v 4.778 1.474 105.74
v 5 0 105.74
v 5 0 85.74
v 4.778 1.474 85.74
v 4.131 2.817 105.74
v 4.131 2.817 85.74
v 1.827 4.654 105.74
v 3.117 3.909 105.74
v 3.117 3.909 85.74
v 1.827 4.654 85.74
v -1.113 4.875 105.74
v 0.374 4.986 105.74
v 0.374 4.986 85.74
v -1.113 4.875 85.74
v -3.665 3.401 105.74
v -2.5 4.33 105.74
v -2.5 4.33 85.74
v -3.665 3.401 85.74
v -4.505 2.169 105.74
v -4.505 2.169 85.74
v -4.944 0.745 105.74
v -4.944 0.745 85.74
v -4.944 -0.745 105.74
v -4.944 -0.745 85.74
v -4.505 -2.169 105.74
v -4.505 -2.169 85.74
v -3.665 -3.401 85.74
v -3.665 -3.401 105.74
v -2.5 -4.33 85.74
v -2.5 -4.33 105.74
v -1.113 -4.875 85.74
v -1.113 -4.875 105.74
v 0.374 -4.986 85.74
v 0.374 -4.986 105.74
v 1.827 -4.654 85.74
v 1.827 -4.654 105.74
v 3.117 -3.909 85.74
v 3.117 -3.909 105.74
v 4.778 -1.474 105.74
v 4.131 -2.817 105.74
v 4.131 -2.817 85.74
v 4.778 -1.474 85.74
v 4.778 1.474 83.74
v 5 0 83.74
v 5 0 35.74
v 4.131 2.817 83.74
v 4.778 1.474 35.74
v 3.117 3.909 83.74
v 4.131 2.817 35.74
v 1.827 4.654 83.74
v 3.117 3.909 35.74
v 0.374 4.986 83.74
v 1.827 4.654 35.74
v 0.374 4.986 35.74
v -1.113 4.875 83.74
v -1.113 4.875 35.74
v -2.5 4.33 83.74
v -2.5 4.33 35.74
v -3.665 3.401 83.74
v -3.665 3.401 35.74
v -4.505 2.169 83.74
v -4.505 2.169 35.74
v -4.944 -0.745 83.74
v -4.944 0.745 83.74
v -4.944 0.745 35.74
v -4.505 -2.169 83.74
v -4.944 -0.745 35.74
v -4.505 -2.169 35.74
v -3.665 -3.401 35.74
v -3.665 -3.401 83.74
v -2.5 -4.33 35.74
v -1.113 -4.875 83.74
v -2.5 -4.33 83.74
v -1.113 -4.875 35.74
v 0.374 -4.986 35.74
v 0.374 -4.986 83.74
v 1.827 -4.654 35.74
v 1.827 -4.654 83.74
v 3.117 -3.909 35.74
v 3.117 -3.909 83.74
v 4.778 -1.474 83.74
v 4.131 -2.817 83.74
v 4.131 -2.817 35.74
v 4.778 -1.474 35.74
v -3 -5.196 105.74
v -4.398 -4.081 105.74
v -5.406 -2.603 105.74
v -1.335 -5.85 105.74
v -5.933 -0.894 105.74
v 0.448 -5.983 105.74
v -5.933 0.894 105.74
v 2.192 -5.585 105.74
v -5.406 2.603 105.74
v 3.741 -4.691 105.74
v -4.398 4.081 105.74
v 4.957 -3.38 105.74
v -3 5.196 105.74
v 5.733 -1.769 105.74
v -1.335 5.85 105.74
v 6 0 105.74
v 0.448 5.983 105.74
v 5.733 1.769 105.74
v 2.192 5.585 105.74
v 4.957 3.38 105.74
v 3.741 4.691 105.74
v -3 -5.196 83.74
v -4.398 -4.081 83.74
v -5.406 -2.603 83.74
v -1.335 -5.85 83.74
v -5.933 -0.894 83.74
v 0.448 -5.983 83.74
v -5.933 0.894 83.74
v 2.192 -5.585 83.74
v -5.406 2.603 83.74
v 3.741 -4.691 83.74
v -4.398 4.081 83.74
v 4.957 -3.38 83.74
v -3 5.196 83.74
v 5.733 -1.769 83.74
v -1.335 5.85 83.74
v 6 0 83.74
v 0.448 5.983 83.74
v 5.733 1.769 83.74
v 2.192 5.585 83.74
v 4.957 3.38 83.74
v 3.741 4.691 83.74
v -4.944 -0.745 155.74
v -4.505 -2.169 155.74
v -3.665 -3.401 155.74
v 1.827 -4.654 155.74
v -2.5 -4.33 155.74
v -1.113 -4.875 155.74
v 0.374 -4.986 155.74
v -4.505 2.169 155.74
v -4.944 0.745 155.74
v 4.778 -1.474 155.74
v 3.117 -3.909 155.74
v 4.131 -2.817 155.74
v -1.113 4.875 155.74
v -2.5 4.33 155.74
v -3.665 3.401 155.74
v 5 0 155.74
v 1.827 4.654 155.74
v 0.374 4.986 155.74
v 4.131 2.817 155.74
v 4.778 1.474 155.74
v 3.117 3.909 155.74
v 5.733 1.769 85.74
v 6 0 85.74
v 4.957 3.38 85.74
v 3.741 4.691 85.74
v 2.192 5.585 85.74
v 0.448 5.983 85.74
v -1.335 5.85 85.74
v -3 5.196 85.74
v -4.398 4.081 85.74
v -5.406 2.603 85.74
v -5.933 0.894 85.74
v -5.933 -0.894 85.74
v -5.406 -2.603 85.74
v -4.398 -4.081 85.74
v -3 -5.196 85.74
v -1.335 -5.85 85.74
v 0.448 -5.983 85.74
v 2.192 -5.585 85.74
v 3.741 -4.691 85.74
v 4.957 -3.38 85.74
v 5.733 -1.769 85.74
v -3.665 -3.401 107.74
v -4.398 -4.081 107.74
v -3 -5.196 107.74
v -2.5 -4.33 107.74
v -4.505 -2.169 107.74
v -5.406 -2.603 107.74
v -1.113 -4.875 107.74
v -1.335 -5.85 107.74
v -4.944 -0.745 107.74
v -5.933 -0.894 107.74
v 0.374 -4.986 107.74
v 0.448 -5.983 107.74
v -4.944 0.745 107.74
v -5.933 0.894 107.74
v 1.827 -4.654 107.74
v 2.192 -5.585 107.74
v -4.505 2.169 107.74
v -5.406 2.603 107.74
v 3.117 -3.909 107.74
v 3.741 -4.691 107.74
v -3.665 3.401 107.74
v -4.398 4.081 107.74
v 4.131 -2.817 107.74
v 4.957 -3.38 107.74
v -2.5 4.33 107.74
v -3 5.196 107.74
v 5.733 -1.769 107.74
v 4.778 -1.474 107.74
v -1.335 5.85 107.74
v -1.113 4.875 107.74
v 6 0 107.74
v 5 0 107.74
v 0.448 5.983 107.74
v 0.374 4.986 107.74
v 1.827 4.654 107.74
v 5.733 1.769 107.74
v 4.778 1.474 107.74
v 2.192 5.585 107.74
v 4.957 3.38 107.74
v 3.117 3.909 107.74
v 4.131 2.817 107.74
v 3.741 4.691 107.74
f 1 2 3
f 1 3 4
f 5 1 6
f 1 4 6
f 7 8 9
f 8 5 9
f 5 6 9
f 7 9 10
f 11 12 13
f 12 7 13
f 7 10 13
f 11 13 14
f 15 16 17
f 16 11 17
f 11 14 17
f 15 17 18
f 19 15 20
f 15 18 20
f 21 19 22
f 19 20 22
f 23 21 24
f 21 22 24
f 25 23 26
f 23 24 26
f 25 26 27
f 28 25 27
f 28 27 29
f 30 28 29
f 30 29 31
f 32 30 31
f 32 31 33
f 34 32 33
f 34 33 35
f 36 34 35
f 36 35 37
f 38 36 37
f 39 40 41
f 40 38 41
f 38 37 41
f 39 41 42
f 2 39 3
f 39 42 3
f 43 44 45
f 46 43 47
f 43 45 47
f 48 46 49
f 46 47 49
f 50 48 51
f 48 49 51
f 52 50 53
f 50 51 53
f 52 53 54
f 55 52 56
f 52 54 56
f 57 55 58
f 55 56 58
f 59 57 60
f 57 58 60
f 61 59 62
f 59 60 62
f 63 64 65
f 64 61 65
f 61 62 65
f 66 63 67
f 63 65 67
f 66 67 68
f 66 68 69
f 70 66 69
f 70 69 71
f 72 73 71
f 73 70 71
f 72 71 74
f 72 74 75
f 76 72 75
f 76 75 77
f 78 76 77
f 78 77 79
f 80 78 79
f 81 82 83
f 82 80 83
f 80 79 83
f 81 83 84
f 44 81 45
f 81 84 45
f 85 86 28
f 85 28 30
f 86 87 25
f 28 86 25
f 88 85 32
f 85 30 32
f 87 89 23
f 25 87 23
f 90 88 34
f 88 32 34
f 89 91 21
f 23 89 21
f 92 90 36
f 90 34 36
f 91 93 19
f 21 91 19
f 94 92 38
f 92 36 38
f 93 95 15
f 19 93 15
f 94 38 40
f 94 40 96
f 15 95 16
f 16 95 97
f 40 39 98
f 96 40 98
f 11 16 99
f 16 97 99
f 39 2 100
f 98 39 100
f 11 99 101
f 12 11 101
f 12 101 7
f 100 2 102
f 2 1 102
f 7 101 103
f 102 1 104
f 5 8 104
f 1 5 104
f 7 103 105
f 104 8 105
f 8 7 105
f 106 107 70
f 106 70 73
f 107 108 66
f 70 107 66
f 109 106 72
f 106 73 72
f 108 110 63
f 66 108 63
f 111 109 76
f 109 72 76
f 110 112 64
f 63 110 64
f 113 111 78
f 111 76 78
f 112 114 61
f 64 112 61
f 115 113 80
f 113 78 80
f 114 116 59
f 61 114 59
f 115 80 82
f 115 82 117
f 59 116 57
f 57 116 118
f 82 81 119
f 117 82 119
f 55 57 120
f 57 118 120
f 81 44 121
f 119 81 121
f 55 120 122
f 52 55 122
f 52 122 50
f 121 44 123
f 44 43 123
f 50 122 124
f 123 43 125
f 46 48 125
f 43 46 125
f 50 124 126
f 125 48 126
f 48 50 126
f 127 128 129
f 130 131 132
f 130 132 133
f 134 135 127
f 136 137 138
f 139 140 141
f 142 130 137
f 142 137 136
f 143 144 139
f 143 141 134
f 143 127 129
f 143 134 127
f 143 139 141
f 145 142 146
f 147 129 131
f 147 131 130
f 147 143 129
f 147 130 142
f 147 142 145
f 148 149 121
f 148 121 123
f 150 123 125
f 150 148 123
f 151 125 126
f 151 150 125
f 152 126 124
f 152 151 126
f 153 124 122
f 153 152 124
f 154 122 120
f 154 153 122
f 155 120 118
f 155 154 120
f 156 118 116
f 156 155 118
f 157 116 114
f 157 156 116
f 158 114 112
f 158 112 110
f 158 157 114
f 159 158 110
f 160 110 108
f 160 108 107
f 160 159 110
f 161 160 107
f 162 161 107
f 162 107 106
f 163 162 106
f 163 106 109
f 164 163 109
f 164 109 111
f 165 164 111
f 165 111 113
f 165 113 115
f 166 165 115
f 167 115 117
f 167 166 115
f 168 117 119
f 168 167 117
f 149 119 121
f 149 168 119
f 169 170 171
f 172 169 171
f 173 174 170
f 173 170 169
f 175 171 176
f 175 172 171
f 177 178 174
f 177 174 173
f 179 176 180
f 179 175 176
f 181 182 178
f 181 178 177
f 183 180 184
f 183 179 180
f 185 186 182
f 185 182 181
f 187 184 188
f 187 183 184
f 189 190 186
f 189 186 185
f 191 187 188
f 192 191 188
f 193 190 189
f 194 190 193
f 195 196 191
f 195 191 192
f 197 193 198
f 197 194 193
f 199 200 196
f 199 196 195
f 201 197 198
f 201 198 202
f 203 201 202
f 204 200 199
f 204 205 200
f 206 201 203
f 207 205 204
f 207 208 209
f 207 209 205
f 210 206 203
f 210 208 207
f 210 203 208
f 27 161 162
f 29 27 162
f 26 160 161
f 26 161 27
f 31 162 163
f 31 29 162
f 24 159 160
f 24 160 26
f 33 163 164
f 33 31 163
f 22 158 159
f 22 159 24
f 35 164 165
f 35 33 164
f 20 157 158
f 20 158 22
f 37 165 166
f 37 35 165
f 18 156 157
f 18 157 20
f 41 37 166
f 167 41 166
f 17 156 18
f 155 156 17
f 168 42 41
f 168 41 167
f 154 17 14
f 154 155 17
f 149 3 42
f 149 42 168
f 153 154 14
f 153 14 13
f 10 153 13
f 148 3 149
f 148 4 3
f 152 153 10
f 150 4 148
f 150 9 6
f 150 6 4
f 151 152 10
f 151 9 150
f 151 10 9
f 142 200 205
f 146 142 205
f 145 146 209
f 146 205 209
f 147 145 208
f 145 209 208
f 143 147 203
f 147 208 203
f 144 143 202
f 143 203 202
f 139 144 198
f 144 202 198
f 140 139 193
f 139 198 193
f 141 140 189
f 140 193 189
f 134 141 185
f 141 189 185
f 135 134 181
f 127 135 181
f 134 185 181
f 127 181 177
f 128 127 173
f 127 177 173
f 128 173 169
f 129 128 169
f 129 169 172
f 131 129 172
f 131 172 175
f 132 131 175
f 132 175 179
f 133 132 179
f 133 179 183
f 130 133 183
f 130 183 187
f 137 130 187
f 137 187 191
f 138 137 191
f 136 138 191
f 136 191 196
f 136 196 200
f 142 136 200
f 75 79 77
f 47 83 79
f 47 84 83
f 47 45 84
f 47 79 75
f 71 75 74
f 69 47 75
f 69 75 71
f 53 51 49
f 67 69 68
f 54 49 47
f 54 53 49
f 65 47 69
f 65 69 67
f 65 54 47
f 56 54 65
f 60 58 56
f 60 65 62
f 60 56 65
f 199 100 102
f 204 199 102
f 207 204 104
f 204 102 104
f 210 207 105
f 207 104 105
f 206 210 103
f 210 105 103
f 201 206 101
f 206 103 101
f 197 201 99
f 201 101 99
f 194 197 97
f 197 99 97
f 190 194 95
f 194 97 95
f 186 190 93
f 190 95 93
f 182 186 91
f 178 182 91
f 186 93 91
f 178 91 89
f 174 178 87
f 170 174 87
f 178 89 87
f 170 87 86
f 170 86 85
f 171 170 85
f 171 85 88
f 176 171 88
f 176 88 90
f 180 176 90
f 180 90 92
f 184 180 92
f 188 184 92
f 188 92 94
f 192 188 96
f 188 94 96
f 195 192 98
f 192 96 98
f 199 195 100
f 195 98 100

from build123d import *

# Parameters (mm, degrees)
SKETCH1_R           = 5
BOSS_EXTRUDE1_DEPTH = 191.48
SKETCH2_R           = 6
BOSS_EXTRUDE2_DEPTH = 2
SKETCH3_R           = 5
CUT_EXTRUDE1_DEPTH  = 35.74
SKETCH4_R           = 5
CUT_EXTRUDE2_DEPTH  = 35.74


with BuildPart() as part:
    # Sketch1 → Boss-Extrude1 (new body)
    with BuildSketch(Plane.XY):
        Circle(SKETCH1_R)
    extrude(amount=BOSS_EXTRUDE1_DEPTH)

    # Sketch2 → Boss-Extrude2 (add)
    with BuildSketch(Plane.XY.offset(105.74)):
        Circle(SKETCH2_R)
    boss_extrude2 = extrude(amount=BOSS_EXTRUDE2_DEPTH)

    # Mirror1: Boss-Extrude2 across plane
    add(boss_extrude2.mirror(Plane.XY.offset(95.74)))

    # Sketch3 → Cut-Extrude1 (cut)
    with BuildSketch(Plane.XY.offset(191.48)):
        Circle(SKETCH3_R)
    extrude(amount=-CUT_EXTRUDE1_DEPTH, mode=Mode.SUBTRACT)

    # Sketch4 → Cut-Extrude2 (cut)
    with BuildSketch(Plane(origin=(0, 0, 0), x_dir=(-1, 0, 0), z_dir=(0, 0, -1))):
        Circle(SKETCH4_R)
    extrude(amount=-CUT_EXTRUDE2_DEPTH, mode=Mode.SUBTRACT)


solid = part.part
